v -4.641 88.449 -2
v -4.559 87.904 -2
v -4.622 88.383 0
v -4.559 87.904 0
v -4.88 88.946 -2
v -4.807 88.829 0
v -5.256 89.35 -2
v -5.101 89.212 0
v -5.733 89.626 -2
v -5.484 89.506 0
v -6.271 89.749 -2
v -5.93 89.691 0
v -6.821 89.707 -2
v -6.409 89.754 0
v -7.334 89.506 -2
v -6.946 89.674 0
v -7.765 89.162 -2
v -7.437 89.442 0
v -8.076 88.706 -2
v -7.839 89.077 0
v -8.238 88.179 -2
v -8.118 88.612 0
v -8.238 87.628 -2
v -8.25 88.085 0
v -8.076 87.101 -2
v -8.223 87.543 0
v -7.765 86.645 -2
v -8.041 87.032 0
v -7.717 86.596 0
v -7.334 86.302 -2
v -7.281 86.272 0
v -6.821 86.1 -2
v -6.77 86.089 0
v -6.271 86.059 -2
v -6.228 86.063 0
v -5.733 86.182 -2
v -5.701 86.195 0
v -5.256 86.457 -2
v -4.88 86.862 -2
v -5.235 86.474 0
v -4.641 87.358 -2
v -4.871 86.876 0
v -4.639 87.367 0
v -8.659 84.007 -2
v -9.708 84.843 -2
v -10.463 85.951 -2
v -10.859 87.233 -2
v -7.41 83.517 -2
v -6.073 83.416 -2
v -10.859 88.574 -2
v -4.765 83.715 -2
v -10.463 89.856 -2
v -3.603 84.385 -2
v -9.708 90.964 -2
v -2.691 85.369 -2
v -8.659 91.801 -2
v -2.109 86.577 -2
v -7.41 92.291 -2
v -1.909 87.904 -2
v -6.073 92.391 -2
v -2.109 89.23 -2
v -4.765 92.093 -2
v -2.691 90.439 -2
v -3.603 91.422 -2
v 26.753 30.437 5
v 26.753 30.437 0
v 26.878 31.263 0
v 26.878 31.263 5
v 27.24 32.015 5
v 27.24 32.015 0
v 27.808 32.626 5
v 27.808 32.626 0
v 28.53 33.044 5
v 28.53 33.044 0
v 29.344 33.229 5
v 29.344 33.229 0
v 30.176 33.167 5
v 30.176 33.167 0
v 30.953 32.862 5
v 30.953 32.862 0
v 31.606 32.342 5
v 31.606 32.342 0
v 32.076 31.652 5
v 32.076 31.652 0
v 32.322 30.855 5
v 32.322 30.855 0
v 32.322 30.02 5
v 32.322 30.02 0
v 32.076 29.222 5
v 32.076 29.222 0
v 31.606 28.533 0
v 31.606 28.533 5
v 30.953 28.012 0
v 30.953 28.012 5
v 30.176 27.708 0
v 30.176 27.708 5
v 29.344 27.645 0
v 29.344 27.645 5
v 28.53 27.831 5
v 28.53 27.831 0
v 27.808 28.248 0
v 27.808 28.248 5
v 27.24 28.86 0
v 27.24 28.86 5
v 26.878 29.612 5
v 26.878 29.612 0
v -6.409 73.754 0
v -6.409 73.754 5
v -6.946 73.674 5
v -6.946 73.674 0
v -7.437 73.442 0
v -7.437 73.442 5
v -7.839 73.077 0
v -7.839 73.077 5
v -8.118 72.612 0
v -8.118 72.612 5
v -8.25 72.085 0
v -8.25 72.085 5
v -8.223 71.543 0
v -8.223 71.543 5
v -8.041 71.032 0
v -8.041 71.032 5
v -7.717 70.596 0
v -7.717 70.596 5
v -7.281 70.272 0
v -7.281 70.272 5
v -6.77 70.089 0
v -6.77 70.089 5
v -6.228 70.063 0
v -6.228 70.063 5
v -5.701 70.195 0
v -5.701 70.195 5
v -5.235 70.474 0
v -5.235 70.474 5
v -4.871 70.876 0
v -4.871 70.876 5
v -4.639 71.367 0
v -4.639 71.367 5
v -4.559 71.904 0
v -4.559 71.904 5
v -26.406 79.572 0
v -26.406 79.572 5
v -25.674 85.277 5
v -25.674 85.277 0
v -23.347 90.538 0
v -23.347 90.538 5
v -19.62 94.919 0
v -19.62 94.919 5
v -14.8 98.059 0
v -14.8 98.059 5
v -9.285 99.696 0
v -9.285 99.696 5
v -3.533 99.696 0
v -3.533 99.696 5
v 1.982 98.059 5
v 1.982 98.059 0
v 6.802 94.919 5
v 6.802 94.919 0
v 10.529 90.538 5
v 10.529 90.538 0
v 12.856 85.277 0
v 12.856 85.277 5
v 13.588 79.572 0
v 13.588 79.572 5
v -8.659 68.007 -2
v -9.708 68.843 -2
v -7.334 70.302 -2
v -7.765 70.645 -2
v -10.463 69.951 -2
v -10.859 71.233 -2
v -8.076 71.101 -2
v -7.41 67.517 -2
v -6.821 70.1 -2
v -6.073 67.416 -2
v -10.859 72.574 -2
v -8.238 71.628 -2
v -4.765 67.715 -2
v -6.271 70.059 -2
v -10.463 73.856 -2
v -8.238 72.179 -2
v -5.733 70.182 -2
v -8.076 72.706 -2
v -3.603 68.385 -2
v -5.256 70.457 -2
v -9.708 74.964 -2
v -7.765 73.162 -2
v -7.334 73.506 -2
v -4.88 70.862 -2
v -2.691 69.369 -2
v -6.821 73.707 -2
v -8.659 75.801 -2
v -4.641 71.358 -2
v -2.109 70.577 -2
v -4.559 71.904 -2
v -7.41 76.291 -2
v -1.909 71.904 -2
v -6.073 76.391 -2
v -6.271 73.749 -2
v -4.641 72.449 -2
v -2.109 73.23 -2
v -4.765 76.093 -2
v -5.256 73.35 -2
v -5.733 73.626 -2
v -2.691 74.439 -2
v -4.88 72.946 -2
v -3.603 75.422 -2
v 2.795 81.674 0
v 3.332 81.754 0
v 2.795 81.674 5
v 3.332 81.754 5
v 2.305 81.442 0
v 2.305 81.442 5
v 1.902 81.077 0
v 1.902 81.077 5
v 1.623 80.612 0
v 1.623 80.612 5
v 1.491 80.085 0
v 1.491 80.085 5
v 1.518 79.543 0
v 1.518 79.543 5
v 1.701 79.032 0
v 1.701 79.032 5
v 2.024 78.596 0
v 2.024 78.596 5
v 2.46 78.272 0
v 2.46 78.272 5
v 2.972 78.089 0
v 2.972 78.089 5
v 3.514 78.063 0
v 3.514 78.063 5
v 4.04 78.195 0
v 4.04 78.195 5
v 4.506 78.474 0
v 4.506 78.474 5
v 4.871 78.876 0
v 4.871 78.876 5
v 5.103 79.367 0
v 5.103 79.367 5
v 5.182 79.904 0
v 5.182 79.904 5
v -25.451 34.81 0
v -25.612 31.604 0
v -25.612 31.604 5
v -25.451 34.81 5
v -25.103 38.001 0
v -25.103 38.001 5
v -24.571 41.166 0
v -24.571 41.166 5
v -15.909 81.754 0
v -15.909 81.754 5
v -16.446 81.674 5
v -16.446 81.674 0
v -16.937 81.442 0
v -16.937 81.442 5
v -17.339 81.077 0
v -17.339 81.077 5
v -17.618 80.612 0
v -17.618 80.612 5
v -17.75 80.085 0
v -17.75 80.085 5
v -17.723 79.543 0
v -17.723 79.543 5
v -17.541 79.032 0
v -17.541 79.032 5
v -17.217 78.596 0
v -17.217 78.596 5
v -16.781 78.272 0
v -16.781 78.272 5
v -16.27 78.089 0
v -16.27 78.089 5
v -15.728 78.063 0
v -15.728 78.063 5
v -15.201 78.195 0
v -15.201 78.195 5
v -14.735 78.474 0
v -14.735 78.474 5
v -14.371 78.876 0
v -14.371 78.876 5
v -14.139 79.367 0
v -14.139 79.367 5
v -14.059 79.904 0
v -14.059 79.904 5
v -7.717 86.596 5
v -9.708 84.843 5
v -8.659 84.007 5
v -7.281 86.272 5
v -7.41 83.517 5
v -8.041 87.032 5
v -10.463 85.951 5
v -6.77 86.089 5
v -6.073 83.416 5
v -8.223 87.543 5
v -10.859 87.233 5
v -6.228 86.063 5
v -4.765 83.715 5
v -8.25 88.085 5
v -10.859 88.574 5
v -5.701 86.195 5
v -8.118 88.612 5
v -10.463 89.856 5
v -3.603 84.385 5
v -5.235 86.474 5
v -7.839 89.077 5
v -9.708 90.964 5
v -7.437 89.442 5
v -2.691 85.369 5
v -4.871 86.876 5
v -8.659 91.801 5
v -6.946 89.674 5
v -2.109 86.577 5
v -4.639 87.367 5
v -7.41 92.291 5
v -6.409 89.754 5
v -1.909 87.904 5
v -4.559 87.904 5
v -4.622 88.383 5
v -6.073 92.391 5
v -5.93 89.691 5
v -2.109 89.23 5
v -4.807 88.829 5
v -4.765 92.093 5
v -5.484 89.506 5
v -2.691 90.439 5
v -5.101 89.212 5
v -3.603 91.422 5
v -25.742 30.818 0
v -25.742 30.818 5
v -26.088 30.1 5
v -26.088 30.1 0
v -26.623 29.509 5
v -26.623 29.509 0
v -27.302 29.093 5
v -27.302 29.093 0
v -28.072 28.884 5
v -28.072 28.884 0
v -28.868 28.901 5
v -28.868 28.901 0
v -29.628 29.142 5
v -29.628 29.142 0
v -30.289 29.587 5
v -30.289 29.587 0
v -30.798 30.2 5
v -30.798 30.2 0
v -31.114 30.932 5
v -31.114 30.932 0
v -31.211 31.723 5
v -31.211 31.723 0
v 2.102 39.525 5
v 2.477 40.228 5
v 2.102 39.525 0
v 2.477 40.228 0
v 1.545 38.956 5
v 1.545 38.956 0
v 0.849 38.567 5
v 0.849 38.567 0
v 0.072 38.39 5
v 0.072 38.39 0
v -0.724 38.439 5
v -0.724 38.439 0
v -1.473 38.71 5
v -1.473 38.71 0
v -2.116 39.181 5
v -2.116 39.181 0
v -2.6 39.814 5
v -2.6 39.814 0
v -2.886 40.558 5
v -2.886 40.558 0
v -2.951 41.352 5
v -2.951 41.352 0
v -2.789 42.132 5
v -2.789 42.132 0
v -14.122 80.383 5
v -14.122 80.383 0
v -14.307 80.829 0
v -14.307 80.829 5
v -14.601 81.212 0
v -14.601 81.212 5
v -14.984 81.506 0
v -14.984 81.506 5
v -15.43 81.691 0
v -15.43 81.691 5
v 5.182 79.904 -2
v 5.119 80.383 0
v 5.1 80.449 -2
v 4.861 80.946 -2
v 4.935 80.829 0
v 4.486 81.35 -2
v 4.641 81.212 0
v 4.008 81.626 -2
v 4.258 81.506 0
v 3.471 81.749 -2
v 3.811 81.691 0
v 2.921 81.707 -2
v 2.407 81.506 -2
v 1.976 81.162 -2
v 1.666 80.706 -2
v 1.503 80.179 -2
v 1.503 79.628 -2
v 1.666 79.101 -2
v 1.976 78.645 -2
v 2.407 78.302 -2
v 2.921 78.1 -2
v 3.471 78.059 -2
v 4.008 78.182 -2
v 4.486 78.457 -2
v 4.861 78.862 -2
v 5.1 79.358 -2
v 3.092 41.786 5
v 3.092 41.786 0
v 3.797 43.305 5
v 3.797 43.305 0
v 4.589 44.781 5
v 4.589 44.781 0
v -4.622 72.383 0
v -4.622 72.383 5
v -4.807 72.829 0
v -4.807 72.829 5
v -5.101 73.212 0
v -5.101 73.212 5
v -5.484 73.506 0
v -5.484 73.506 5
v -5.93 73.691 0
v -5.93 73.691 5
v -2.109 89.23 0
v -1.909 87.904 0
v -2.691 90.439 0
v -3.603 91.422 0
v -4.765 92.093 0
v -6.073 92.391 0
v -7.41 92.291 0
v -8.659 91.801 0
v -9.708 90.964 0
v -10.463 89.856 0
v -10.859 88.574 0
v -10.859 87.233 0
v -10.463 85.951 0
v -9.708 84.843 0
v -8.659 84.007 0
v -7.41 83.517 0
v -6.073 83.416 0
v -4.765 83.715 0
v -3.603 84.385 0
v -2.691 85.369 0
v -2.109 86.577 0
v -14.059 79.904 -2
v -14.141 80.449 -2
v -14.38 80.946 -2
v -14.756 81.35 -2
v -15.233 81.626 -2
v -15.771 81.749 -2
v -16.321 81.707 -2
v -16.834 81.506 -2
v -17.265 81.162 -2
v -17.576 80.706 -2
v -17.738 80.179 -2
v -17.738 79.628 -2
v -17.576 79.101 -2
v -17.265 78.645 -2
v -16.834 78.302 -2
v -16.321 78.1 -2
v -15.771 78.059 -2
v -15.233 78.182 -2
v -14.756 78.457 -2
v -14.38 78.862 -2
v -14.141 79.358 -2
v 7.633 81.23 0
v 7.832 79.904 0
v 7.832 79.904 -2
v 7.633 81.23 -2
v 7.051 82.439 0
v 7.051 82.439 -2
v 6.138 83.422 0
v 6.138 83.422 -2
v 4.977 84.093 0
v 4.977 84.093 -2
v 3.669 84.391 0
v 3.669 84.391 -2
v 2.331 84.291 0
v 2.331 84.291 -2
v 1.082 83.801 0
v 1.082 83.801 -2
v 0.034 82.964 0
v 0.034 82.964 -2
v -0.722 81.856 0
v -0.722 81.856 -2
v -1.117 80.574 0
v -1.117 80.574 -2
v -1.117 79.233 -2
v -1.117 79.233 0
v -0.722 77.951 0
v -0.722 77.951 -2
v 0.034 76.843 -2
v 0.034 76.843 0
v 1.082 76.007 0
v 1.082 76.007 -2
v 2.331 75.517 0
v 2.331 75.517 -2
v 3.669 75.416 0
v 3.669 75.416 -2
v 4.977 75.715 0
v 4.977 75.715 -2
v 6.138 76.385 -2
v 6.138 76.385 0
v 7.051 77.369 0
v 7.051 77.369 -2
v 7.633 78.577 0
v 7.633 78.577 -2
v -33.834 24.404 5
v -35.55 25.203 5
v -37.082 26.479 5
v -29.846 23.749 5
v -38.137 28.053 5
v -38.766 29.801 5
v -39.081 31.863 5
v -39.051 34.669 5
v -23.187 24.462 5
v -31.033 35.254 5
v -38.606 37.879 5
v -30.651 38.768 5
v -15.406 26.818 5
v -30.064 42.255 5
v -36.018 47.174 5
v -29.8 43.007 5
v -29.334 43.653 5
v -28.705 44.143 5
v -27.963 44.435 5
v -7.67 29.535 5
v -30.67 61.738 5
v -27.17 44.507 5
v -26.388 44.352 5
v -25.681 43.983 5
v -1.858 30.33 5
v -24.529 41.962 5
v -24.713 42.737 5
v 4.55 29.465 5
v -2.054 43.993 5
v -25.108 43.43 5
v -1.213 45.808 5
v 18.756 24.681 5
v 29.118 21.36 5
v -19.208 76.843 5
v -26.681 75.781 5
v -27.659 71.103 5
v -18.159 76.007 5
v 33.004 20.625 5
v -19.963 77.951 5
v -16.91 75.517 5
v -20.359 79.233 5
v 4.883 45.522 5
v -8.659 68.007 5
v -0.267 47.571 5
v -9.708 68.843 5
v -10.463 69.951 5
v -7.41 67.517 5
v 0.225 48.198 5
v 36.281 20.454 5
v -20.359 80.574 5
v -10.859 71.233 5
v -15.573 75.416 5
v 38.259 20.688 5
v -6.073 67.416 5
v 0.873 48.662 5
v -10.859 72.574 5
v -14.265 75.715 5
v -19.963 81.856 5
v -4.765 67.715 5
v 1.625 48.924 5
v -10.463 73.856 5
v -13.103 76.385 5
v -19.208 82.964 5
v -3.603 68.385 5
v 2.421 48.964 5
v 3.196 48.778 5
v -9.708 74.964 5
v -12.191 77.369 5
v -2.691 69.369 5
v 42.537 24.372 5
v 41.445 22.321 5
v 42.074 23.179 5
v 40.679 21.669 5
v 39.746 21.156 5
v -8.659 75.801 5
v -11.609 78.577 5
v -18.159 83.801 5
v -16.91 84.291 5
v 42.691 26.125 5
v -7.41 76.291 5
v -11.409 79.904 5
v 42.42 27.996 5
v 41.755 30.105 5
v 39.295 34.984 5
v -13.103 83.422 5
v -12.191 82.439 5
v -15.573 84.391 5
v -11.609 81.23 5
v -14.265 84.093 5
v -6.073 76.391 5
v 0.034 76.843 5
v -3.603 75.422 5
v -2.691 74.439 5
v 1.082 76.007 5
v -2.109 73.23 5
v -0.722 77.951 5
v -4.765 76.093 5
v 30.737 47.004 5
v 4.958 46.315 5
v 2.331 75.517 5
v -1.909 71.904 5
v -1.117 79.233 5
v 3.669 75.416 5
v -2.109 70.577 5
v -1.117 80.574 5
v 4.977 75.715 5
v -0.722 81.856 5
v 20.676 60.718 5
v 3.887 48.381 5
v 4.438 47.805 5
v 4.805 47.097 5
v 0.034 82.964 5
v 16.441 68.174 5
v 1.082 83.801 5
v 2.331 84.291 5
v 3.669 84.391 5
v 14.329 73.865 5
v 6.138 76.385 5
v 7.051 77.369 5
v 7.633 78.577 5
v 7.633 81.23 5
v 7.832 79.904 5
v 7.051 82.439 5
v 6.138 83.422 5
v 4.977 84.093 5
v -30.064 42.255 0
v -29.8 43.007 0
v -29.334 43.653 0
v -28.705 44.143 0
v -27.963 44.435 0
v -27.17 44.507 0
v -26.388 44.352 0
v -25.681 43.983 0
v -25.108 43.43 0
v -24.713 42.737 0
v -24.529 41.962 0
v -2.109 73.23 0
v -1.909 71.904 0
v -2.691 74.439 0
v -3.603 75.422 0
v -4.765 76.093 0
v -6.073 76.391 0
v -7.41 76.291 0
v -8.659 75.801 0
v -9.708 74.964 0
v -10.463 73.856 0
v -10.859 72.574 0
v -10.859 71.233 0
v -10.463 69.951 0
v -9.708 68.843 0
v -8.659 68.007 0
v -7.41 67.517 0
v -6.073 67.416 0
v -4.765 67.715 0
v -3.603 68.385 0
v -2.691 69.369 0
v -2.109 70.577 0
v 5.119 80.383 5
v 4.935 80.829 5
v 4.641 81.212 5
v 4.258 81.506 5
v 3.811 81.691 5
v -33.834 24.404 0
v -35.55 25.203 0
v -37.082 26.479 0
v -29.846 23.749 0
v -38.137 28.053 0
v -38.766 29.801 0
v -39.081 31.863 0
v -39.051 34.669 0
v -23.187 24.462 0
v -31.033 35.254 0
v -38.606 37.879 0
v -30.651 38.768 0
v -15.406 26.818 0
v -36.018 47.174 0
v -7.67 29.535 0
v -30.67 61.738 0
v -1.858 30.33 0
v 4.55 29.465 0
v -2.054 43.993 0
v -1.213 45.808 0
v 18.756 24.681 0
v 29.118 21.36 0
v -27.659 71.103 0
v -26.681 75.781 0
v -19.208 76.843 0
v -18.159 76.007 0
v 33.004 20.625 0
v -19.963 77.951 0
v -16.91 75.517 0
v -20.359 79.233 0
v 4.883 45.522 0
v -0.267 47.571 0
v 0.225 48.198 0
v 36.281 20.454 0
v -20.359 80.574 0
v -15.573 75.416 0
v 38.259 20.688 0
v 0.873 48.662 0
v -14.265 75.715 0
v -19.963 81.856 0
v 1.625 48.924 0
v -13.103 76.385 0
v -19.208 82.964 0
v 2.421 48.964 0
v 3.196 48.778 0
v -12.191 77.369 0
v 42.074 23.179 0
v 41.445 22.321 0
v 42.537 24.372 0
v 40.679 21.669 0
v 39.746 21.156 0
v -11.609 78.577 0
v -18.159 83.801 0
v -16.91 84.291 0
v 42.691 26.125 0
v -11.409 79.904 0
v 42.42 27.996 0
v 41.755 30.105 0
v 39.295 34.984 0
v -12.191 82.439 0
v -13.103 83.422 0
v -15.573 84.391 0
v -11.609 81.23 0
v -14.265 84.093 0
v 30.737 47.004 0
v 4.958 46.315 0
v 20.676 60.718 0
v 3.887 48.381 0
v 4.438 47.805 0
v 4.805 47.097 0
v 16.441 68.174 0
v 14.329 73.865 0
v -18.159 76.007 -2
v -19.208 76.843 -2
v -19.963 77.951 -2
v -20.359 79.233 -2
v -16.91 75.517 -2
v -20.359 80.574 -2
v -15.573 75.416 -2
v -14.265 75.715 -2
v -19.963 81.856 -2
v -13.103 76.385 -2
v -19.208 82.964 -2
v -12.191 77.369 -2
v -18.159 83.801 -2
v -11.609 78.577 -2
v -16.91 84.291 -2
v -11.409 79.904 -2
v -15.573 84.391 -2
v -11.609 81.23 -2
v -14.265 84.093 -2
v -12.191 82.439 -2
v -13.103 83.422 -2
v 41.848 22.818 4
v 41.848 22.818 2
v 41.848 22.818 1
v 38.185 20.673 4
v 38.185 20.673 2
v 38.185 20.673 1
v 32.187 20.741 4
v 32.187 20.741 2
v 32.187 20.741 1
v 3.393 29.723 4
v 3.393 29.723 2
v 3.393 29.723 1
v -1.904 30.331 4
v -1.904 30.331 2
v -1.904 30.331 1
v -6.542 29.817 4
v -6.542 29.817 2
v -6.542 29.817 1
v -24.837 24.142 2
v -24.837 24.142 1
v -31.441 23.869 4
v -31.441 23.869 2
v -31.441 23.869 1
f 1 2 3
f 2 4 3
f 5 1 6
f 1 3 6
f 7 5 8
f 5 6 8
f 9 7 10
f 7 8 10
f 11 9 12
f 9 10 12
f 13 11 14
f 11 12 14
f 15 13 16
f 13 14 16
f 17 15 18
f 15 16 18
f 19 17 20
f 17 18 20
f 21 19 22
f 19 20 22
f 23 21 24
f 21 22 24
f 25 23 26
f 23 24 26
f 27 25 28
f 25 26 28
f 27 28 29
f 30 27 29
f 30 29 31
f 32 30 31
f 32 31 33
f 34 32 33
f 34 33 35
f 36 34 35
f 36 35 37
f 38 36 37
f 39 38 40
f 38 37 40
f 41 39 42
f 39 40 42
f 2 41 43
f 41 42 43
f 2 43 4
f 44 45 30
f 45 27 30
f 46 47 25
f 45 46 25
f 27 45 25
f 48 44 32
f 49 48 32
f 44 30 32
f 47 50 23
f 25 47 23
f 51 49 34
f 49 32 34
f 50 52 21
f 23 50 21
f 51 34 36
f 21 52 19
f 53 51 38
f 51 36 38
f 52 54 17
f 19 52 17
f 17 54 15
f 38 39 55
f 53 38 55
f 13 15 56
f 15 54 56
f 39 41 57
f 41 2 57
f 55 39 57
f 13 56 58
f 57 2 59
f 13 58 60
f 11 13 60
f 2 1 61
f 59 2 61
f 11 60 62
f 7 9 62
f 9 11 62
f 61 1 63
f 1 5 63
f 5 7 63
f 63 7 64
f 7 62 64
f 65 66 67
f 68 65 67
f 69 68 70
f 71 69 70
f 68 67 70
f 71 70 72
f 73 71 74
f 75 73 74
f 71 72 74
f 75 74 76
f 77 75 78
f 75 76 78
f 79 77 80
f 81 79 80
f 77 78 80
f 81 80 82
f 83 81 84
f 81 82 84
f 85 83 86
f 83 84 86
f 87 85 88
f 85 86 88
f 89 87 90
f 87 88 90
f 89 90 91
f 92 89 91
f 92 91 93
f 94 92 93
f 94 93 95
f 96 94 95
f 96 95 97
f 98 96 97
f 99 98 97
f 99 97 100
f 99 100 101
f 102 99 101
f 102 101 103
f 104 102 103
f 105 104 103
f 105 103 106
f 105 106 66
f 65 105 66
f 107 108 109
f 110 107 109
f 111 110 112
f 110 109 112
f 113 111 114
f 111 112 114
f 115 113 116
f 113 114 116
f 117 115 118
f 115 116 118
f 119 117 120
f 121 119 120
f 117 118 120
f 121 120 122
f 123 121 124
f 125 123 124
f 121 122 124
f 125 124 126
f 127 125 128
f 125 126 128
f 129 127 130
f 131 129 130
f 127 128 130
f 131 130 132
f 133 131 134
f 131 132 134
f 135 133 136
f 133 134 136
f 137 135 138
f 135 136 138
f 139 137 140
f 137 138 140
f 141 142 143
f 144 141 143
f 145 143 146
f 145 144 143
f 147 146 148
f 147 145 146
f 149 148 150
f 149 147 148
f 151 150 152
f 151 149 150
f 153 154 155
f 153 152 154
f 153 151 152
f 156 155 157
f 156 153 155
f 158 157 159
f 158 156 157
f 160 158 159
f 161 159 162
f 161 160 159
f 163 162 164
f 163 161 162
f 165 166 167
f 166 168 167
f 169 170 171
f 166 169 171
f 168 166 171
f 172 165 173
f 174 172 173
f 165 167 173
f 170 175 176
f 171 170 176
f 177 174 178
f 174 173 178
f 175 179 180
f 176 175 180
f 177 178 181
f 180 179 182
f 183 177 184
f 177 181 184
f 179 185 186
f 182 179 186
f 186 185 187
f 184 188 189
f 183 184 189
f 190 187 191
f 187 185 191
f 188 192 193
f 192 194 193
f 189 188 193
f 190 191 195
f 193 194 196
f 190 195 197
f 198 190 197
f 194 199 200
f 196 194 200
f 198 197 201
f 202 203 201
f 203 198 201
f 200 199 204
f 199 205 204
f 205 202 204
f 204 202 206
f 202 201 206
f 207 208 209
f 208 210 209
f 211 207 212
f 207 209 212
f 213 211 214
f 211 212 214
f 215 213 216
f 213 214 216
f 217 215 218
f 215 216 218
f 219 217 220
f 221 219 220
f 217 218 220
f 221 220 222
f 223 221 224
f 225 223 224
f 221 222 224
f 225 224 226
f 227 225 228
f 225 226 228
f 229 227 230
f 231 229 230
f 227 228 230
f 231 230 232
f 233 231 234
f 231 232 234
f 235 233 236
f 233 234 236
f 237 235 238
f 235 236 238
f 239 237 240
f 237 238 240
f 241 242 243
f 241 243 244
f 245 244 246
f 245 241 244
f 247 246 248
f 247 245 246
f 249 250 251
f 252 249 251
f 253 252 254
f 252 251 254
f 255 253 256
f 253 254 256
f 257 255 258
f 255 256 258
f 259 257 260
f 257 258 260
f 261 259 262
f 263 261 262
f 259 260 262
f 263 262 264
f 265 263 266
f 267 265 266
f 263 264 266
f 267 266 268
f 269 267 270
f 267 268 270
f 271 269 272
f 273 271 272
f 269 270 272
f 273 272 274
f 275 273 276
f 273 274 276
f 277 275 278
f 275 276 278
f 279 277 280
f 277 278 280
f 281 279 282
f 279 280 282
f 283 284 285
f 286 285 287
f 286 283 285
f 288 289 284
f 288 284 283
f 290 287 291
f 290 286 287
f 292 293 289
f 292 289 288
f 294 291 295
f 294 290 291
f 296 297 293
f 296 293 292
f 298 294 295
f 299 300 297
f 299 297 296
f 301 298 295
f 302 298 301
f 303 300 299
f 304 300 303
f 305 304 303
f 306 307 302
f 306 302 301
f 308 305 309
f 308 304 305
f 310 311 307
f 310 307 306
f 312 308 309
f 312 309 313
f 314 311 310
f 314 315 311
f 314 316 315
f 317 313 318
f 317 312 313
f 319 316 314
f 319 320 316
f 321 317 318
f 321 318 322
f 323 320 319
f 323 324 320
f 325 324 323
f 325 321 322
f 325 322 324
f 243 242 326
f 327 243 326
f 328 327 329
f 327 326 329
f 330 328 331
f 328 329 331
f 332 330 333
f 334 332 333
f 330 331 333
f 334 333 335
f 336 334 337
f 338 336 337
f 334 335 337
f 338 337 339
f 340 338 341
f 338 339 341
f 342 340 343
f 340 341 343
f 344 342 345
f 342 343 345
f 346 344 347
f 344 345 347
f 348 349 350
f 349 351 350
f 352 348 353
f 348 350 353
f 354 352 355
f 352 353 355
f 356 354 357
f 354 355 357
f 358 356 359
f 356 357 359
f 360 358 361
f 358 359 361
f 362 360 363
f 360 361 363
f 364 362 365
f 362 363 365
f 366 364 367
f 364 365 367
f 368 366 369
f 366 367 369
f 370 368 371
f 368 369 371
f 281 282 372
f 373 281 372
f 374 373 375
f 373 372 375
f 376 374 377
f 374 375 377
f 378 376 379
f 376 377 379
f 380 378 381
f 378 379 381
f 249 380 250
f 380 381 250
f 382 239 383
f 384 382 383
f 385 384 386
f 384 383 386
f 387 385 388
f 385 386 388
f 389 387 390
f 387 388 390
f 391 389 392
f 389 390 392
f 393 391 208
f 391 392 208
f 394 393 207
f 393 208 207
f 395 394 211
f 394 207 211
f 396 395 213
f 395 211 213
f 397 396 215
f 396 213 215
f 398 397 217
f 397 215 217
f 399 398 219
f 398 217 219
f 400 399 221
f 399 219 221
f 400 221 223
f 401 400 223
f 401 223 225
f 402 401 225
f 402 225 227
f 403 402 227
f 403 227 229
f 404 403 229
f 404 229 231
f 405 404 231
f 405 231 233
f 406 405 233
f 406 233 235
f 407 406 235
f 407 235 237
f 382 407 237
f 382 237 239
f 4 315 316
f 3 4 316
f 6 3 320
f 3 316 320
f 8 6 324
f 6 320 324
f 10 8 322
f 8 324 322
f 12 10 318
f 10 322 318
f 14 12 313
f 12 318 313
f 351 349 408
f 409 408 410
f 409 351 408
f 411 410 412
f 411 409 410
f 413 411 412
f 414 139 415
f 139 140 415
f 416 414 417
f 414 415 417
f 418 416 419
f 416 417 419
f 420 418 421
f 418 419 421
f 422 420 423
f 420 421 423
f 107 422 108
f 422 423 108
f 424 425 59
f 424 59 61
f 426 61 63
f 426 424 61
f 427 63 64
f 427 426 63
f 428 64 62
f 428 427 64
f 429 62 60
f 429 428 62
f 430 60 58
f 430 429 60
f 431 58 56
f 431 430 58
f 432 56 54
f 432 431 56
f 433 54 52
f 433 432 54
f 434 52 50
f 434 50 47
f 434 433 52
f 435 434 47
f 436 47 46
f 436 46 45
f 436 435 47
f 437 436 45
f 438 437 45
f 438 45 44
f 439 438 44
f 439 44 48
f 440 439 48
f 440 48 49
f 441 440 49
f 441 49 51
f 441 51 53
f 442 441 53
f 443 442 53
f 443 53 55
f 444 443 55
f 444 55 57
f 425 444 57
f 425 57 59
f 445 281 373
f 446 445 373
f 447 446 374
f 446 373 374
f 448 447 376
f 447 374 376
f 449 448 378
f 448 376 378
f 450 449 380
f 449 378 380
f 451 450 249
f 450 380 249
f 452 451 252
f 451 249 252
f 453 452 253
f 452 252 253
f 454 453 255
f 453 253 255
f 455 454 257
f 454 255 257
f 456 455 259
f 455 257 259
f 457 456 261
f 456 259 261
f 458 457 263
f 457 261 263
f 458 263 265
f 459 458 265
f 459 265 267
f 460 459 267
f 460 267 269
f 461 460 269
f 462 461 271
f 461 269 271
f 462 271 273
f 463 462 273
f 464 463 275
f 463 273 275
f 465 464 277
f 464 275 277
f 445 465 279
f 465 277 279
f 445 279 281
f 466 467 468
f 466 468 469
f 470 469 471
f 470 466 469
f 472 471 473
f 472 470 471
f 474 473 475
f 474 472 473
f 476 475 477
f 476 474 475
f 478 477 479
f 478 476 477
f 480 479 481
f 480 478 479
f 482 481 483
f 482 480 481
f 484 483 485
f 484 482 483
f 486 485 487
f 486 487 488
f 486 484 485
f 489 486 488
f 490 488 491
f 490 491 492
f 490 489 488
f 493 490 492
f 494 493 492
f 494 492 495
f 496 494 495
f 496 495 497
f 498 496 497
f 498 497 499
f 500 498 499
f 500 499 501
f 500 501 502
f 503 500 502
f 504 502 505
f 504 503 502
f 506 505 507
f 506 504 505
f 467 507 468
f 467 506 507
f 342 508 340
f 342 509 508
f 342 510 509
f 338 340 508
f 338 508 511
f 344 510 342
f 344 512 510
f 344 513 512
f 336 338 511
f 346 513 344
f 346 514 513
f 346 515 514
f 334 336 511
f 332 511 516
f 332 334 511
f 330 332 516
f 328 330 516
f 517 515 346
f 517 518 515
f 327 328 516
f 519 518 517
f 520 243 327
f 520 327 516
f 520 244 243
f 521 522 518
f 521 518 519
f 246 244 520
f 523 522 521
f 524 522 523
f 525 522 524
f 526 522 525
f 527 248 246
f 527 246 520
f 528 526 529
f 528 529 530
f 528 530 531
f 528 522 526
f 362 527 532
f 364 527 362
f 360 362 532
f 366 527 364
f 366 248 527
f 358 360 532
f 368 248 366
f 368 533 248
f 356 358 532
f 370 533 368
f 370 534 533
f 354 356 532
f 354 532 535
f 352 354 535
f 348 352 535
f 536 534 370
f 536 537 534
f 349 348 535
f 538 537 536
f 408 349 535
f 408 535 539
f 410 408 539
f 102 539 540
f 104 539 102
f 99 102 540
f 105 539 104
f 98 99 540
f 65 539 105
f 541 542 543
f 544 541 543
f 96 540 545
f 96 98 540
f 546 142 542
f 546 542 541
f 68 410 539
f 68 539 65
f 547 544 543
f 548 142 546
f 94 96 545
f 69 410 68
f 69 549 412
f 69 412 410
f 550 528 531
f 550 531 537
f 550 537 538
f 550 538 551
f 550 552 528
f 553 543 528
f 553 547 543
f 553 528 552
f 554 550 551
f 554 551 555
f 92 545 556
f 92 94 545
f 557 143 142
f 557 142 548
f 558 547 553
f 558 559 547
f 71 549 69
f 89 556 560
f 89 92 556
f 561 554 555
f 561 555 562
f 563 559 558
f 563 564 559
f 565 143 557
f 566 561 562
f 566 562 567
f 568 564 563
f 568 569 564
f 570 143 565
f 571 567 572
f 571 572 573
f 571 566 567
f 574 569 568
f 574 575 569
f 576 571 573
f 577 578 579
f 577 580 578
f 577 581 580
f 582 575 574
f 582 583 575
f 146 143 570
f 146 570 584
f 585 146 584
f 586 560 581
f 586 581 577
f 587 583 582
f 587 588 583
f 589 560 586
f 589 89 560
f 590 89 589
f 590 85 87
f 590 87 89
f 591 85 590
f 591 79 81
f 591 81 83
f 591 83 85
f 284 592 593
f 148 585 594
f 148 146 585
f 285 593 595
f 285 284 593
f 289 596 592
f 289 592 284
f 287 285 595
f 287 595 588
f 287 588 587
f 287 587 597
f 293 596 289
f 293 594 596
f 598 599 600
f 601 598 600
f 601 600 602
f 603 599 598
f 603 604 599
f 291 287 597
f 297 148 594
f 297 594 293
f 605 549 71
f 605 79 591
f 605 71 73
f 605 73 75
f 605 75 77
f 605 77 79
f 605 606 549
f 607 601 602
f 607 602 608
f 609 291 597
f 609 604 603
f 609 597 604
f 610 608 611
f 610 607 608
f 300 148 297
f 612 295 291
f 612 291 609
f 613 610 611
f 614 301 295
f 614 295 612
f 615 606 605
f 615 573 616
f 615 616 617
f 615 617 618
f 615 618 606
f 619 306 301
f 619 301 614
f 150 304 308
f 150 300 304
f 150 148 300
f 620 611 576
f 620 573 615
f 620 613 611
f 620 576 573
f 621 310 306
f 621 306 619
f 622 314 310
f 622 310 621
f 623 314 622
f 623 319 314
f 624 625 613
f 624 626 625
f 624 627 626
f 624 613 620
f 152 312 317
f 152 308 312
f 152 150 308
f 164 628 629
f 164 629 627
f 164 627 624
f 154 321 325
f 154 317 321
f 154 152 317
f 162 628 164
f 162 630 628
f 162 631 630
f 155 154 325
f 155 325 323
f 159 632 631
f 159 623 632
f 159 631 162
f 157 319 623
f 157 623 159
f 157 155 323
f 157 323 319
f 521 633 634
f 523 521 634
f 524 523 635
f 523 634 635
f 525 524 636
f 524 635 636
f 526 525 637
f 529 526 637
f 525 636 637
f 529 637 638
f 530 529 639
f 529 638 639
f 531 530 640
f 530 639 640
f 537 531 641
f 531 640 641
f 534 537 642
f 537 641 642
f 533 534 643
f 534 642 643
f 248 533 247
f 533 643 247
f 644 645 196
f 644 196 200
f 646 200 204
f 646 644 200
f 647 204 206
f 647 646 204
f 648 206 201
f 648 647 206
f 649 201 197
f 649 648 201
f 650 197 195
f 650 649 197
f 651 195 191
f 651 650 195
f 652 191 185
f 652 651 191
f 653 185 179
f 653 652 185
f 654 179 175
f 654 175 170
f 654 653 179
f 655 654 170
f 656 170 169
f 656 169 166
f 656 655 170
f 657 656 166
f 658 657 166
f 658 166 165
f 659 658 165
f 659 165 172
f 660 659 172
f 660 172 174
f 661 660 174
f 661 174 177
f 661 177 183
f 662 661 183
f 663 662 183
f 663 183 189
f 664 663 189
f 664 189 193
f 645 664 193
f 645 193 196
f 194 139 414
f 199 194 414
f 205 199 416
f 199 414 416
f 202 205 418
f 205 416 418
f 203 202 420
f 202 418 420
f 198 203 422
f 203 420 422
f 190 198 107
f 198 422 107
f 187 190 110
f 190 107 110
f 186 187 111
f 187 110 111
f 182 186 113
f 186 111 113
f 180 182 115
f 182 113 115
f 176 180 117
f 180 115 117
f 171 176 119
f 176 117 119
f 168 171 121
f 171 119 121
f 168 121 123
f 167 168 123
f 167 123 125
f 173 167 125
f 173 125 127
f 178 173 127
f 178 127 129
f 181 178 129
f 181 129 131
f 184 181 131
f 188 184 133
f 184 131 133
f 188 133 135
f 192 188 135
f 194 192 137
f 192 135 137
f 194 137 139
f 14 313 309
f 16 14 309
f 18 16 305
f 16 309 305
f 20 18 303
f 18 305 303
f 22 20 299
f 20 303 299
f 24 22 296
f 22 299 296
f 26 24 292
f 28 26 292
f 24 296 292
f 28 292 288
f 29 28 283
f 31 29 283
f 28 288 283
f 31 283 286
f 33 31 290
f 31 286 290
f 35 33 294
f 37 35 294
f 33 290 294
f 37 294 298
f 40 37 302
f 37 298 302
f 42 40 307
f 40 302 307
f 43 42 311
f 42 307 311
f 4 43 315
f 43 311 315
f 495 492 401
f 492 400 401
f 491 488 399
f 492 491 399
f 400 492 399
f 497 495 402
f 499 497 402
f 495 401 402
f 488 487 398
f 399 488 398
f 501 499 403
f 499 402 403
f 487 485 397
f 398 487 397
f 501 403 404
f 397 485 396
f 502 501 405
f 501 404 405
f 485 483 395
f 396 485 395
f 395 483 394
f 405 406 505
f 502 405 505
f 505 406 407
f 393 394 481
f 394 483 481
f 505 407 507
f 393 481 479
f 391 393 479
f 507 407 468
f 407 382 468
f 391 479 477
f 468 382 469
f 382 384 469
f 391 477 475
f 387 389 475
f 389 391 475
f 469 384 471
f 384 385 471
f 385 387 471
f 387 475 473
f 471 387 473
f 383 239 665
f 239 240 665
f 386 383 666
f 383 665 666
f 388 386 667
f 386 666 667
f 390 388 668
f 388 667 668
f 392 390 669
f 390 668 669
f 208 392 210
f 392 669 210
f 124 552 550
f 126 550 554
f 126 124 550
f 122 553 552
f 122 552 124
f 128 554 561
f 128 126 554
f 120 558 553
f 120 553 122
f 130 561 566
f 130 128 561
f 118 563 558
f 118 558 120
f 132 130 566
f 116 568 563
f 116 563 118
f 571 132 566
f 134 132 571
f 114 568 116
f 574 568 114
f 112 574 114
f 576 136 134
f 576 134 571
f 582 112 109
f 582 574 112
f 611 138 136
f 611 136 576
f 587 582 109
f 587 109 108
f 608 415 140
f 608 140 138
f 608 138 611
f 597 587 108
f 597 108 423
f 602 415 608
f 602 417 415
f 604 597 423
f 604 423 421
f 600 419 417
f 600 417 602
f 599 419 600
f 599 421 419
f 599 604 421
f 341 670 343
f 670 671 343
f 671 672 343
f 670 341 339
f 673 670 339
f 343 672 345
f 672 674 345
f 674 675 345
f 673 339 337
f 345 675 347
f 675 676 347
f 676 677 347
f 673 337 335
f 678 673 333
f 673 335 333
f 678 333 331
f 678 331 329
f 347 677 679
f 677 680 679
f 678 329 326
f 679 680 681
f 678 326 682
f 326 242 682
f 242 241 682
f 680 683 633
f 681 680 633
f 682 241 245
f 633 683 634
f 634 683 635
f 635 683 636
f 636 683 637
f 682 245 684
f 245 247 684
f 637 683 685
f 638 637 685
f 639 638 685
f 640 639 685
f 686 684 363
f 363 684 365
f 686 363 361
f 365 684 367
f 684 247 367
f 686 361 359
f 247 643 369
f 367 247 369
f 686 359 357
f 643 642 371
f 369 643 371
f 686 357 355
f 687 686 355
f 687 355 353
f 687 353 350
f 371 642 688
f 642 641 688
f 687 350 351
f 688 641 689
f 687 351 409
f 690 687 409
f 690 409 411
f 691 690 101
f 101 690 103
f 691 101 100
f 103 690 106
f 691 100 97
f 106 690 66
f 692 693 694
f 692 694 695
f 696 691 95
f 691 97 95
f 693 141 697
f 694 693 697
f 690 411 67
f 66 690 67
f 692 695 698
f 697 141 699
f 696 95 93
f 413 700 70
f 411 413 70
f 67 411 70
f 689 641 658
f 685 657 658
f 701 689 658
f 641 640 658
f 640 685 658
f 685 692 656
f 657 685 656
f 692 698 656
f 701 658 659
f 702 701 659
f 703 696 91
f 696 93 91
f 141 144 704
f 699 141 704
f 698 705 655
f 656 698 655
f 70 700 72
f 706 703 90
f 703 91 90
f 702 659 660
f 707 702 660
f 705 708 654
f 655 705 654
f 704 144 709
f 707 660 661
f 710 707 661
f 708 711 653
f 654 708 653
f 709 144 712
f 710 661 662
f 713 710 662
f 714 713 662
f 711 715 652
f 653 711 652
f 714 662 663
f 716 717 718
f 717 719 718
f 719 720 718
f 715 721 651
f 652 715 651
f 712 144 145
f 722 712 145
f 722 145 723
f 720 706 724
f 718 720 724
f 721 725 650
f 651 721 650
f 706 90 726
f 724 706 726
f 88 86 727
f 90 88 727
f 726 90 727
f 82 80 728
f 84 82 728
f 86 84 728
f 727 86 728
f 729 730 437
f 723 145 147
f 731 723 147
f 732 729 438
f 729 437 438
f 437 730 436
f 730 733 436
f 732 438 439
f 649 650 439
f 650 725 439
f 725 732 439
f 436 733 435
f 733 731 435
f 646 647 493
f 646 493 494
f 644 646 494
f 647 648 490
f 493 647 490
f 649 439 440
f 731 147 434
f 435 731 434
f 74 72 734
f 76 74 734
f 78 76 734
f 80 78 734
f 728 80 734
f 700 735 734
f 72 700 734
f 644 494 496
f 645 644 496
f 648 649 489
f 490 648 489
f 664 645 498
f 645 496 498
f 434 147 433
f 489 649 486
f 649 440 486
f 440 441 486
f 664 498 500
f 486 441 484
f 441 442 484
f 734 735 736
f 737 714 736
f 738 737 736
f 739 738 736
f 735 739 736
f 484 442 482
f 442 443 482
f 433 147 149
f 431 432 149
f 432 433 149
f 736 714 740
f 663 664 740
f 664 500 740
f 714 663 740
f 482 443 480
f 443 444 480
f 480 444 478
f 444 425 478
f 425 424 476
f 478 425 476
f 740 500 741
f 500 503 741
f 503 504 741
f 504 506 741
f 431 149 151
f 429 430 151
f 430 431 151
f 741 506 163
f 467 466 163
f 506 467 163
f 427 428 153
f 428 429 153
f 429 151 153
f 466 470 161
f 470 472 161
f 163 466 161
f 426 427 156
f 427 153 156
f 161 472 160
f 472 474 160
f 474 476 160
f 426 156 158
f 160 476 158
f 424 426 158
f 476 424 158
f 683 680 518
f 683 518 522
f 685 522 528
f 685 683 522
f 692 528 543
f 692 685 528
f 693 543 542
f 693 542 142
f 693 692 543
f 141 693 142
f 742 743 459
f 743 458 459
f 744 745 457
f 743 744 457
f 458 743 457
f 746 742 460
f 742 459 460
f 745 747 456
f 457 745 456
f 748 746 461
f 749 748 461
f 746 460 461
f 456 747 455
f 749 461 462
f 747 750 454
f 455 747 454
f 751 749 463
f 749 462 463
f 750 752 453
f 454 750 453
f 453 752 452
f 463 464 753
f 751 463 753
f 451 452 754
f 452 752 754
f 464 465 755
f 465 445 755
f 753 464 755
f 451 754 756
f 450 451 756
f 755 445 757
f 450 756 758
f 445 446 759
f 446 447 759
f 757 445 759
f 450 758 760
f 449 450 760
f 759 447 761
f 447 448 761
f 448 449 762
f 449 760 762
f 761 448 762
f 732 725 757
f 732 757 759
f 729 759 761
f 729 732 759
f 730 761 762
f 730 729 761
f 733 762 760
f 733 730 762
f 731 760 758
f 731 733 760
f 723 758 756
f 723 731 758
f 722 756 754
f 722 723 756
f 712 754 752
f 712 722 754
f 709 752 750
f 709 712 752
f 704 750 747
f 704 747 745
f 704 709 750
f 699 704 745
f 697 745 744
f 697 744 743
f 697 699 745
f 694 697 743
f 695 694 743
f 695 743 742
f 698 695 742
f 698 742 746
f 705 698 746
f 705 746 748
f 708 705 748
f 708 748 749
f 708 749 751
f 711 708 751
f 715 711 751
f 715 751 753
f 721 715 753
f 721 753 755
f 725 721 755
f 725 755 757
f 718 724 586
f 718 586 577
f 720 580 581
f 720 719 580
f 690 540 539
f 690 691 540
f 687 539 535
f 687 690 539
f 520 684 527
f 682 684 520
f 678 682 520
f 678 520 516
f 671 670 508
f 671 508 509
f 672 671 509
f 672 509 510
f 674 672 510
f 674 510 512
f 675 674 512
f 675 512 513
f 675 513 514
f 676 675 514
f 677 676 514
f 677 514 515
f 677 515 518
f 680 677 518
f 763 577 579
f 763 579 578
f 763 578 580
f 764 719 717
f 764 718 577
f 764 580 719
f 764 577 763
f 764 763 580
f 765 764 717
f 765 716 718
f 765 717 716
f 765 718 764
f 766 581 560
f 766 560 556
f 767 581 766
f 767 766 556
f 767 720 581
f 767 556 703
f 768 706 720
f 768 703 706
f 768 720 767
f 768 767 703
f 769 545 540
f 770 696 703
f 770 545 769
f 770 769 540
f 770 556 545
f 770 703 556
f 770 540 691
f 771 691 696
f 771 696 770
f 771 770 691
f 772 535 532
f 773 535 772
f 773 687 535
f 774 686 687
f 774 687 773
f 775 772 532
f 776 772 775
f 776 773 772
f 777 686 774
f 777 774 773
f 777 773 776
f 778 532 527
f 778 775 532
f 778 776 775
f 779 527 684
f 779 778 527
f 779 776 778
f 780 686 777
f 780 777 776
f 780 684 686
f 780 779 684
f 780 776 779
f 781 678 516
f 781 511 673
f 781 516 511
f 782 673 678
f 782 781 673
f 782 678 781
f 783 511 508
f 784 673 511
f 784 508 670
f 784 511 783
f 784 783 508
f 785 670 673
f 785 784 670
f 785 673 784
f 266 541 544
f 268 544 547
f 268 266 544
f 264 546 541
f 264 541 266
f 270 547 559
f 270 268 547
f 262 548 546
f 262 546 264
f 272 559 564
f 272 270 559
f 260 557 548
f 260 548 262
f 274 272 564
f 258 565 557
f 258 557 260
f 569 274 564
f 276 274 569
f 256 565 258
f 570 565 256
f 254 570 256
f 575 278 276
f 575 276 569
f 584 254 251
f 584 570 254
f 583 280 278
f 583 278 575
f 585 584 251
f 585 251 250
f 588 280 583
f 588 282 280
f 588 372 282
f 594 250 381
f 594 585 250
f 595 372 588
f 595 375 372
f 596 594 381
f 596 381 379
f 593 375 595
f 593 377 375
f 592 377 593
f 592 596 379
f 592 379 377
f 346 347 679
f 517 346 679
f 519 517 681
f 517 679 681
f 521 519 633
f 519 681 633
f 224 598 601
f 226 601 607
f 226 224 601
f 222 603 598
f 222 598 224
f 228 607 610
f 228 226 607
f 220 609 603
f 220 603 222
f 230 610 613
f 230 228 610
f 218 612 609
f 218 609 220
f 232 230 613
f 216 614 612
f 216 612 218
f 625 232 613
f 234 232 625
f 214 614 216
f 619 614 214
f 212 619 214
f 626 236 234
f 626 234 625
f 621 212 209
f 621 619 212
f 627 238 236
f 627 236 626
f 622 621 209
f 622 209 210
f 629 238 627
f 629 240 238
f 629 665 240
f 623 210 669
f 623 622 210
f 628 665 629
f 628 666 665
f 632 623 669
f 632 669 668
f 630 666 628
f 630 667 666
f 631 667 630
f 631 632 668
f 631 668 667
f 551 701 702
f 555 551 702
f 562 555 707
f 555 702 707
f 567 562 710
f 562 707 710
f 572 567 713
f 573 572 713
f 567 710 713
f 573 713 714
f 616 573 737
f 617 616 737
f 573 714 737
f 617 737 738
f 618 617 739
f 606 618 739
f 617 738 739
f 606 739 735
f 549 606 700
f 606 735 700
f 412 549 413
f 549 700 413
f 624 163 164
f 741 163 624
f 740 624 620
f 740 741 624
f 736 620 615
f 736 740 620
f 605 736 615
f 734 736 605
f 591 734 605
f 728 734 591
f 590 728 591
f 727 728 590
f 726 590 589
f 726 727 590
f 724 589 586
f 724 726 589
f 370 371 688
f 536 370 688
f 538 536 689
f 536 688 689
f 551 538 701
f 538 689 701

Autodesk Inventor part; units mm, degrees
ref_plane "YZ Plane" through (0, 0, 0) normal (1, 0, 0) x (0, 1, 0)
ref_plane "XZ Plane" through (0, 0, 0) normal (0, 1, 0) x (-1, 0, 0)
ref_plane "XY Plane" through (0, 0, 0) normal (0, 0, 1) x (1, 0, 0)
sketch "Sketch1" plane through (0, 0, 0) normal (0, 0, 1) x (1, 0, 0)
  circle A0 centre (-25.0838, -31.7051) radius 2.5 projected
  circle A1 centre (-43.012, -13.2629) radius 2.5 projected
  circle A2 centre (-44.8914, 13.7567) radius 2.5 projected
  circle A3 centre (-28.0838, 36.7109) radius 2.5 construction
  circle A4 centre (0.8935, 43.7288) radius 2.5 construction
  circle A5 centre (29.5533, 30.4373) radius 2.5 projected
  circle A6 centre (43.6662, -0.0951) radius 2.5 projected
  circle A7 centre (47.6662, -52.5951) radius 2.5 projected
  circle A8 centre (10.6662, -52.5951) radius 2.5 projected
  circle A9 centre (-6.8338, -0.0951) radius 8.75 projected
  line L0 (56.6662, -60.0951) -> (51.1662, -0.0951) projected
  spline S0 degree 4 poles (51.1662, -0.0951) (50.0319, 24.6801) (26.25, 55.8136) (-25.1104, 60.0951) (-56.6662, 18.5311) (-54.7055, -22.2338) (-29.645, -43.1708) (-8.3823, -44.3792) (3.1662, -40.8213) knots 0 0 0 0 0 0.330099 0.457579 0.582312 0.704438 0.895347 0.895347 0.895347 0.895347 0.895347 projected
  line L1 (3.1662, -40.8213) -> (3.1662, -60.0951) projected
  line L2 (3.1662, -60.0951) -> (56.6662, -60.0951) projected
  circle A10 centre (-6.8338, -0.0951) radius 80 construction
  circle A11 centre (-6.409, 79.9037) radius 20
  spline S1 degree 4 poles (13.5883, 79.5717) (13.2828, 61.1776) (53.4159, 30.7093) (46.2466, 8.4135) (-3.1072, 37.0942) (-15.1022, 21.9833) (-58.6807, 16.6925) (-26.133, 63.1171) (-26.4062, 79.5717) knots 0 0 0 0 0 0.268909 0.429337 0.564159 0.731942 1 1 1 1 1
  arc A12 (2.161, 46.1761) -> (-0.1558, 41.1804) centre (29.5533, 30.4373) ccw
  arc A13 (-27.3177, 41.7105) -> (-28.4113, 31.6637) centre (29.5533, 30.4373) ccw
  line L3 (29.5533, 30.4373) -> (-27.3177, 41.7105) construction
  line L4 (-28.0838, 36.7109) -> (29.5533, 30.4373) construction
  line L5 (2.161, 46.1761) -> (29.5533, 30.4373) construction
  line L6 (-0.1558, 41.1804) -> (29.5533, 30.4373) construction
  line L7 (0.8935, 43.7288) -> (29.5533, 30.4373) construction
  line L8 (-28.4113, 31.6637) -> (29.5533, 30.4373) construction
  arc A14 (-30.9107, 31.7166) -> (-25.9118, 31.6108) centre (-28.4113, 31.6637) ccw
  arc A15 (-24.8654, 41.2244) -> (-29.77, 42.1966) centre (-27.3177, 41.7105) ccw
  arc A16 (4.3287, 44.9306) -> (-0.0066, 47.4216) centre (2.161, 46.1761) ccw
  arc A17 (-2.5068, 42.0305) -> (2.1952, 40.3302) centre (-0.1558, 41.1804) ccw
  arc A18 (-0.0066, 47.4216) -> (-2.5068, 42.0305) centre (29.5533, 30.4373) ccw
  arc A19 (4.3287, 44.9306) -> (2.1952, 40.3302) centre (29.5533, 30.4373) ccw
  arc A20 (-29.77, 42.1966) -> (-30.9118, 31.6637) centre (29.5533, 30.4373) ccw
  arc A21 (-24.8654, 41.2244) -> (-25.9118, 31.6108) centre (29.5533, 30.4373) ccw
  point P0 (0, 0)
  point P1 (42.6911, 26.1251)
  point P2 (35.4649, 20.4441)
  point P3 (1.223, 30.0999)
  point P4 (-17.2039, 26.1779)
  point P5 (-36.803, 26.1853)
  dimension "d0" = 160
  dimension "d1" = 40
  dimension "d4" = 5
  dimension "d5" = 5
  dimension "d6" = 5
  dimension "d7" = 5
  dimension "d8" = 5
  dimension "d9" = 5
  dimension "d10" = 5
  dimension "d11" = 5
ref_plane "Work Plane1" through (0, 0, 5) normal (0, 0, 1) x (1, 0, 0)
extrude "Extrusion2" add sketch "Sketch1" along normal blind 5 contours S1 S0 | S0 S1 A11 | A11
sketch "Sketch3" plane through (0, 0, 0) normal (0, 0, -1) x (-1, 0, 0)
  circle A0 centre (6.409, 79.9037) radius 20 projected
  circle A1 centre (6.409, 79.9037) radius 8 construction
  circle A2 centre (6.409, 79.9037) radius 9.5 construction
  point P0 (0, 0)
  point P1 (15.909, 79.9037)
  point P2 (6.409, 71.9037)
  point P3 (-3.3325, 79.9037)
  point P4 (6.409, 87.9037)
  dimension "d16" = 19
  dimension "d15" = 16
hole "Hole1" at (-15.909, 79.9037, 0) at (-6.409, 71.9037, 0) at (3.3325, 79.9037, 0) at (-6.409, 87.9037, 0) direction (0, 0, 1) diameter 3.7 end through all
sketch "Sketch4" plane through (0, 0, 5) normal (0, 0, 1) x (1, 0, 0)
  circle A0 centre (3.3325, 79.9037) radius 1.85 projected
  circle A1 centre (-6.409, 71.9037) radius 1.85 projected
  circle A2 centre (-15.909, 79.9037) radius 1.85 projected
  circle A3 centre (-6.409, 87.9037) radius 1.85 projected
  circle A4 centre (3.3325, 79.9037) radius 4.5
  circle A5 centre (-6.409, 71.9037) radius 4.5
  circle A6 centre (-15.909, 79.9037) radius 4.5
  circle A7 centre (-6.409, 87.9037) radius 4.5
  point P0 (0, 0)
  dimension "d24" = 9
  dimension "d25" = 9
  dimension "d26" = 9
  dimension "d27" = 9
extrude "Extrusion3" add sketch "Sketch4" against normal blind 7
sketch "Sketch5" plane through (0, 0, 0) normal (0, 0, -1) x (-1, 0, 0)
  circle A0 centre (-3.3325, 79.9037) radius 4.5 projected
  circle A1 centre (6.409, 71.9037) radius 4.5 projected
  circle A2 centre (6.409, 87.9037) radius 4.5 projected
  circle A3 centre (15.909, 79.9037) radius 4.5 projected
  arc A4 (26.4062, 79.5717) -> (-13.5883, 79.5717) centre (6.409, 79.9037) ccw projected
  arc A5 (25.9118, 31.6108) -> (24.8654, 41.2244) centre (-29.5533, 30.4373) ccw projected
  arc A6 (29.77, 42.1966) -> (24.8654, 41.2244) centre (27.3177, 41.7105) ccw projected
  arc A7 (30.9107, 31.7166) -> (29.77, 42.1966) centre (-29.5533, 30.4373) ccw projected
  arc A8 (25.9118, 31.6108) -> (30.9107, 31.7166) centre (28.4113, 31.6637) ccw projected
  circle A9 centre (-29.5533, 30.4373) radius 2.5 projected
  arc A10 (-2.1952, 40.3302) -> (-4.3287, 44.9306) centre (-29.5533, 30.4373) ccw projected
  arc A11 (0.0066, 47.4216) -> (-4.3287, 44.9306) centre (-2.161, 46.1761) ccw projected
  arc A12 (2.5068, 42.0305) -> (0.0066, 47.4216) centre (-29.5533, 30.4373) ccw projected
  arc A13 (-2.1952, 40.3302) -> (2.5068, 42.0305) centre (0.1558, 41.1804) ccw projected
  circle A14 centre (-29.5533, 30.4373) radius 2.8
  arc A15 (-2.4773, 40.2282) -> (-4.5888, 44.7812) centre (-29.5533, 30.4373) ccw
  arc A16 (-2.4773, 40.2282) -> (2.789, 42.1325) centre (0.1558, 41.1804) ccw
  arc A17 (2.789, 42.1325) -> (0.2668, 47.571) centre (-29.5533, 30.4373) ccw
  arc A18 (0.2668, 47.571) -> (-4.5888, 44.7812) centre (-2.161, 46.1761) ccw
  arc A19 (25.6119, 31.6044) -> (24.5711, 41.166) centre (-29.5533, 30.4373) ccw
  arc A20 (25.6119, 31.6044) -> (31.2106, 31.7229) centre (28.4113, 31.6637) ccw
  arc A21 (31.2106, 31.7229) -> (30.0643, 42.2549) centre (-29.5533, 30.4373) ccw
  arc A22 (30.0643, 42.2549) -> (24.5711, 41.166) centre (27.3177, 41.7105) ccw
  point P0 (0, 0)
  dimension "d30" = 0.3
  dimension "d31" = 0.3
  dimension "d32" = 0.3
extrude "Extrusion4" cut sketch "Sketch5" against normal blind 7 contours A14 | A15 A18 A17 A16 | A19 A22 A21 A20
properties part number "Soporte motor"
